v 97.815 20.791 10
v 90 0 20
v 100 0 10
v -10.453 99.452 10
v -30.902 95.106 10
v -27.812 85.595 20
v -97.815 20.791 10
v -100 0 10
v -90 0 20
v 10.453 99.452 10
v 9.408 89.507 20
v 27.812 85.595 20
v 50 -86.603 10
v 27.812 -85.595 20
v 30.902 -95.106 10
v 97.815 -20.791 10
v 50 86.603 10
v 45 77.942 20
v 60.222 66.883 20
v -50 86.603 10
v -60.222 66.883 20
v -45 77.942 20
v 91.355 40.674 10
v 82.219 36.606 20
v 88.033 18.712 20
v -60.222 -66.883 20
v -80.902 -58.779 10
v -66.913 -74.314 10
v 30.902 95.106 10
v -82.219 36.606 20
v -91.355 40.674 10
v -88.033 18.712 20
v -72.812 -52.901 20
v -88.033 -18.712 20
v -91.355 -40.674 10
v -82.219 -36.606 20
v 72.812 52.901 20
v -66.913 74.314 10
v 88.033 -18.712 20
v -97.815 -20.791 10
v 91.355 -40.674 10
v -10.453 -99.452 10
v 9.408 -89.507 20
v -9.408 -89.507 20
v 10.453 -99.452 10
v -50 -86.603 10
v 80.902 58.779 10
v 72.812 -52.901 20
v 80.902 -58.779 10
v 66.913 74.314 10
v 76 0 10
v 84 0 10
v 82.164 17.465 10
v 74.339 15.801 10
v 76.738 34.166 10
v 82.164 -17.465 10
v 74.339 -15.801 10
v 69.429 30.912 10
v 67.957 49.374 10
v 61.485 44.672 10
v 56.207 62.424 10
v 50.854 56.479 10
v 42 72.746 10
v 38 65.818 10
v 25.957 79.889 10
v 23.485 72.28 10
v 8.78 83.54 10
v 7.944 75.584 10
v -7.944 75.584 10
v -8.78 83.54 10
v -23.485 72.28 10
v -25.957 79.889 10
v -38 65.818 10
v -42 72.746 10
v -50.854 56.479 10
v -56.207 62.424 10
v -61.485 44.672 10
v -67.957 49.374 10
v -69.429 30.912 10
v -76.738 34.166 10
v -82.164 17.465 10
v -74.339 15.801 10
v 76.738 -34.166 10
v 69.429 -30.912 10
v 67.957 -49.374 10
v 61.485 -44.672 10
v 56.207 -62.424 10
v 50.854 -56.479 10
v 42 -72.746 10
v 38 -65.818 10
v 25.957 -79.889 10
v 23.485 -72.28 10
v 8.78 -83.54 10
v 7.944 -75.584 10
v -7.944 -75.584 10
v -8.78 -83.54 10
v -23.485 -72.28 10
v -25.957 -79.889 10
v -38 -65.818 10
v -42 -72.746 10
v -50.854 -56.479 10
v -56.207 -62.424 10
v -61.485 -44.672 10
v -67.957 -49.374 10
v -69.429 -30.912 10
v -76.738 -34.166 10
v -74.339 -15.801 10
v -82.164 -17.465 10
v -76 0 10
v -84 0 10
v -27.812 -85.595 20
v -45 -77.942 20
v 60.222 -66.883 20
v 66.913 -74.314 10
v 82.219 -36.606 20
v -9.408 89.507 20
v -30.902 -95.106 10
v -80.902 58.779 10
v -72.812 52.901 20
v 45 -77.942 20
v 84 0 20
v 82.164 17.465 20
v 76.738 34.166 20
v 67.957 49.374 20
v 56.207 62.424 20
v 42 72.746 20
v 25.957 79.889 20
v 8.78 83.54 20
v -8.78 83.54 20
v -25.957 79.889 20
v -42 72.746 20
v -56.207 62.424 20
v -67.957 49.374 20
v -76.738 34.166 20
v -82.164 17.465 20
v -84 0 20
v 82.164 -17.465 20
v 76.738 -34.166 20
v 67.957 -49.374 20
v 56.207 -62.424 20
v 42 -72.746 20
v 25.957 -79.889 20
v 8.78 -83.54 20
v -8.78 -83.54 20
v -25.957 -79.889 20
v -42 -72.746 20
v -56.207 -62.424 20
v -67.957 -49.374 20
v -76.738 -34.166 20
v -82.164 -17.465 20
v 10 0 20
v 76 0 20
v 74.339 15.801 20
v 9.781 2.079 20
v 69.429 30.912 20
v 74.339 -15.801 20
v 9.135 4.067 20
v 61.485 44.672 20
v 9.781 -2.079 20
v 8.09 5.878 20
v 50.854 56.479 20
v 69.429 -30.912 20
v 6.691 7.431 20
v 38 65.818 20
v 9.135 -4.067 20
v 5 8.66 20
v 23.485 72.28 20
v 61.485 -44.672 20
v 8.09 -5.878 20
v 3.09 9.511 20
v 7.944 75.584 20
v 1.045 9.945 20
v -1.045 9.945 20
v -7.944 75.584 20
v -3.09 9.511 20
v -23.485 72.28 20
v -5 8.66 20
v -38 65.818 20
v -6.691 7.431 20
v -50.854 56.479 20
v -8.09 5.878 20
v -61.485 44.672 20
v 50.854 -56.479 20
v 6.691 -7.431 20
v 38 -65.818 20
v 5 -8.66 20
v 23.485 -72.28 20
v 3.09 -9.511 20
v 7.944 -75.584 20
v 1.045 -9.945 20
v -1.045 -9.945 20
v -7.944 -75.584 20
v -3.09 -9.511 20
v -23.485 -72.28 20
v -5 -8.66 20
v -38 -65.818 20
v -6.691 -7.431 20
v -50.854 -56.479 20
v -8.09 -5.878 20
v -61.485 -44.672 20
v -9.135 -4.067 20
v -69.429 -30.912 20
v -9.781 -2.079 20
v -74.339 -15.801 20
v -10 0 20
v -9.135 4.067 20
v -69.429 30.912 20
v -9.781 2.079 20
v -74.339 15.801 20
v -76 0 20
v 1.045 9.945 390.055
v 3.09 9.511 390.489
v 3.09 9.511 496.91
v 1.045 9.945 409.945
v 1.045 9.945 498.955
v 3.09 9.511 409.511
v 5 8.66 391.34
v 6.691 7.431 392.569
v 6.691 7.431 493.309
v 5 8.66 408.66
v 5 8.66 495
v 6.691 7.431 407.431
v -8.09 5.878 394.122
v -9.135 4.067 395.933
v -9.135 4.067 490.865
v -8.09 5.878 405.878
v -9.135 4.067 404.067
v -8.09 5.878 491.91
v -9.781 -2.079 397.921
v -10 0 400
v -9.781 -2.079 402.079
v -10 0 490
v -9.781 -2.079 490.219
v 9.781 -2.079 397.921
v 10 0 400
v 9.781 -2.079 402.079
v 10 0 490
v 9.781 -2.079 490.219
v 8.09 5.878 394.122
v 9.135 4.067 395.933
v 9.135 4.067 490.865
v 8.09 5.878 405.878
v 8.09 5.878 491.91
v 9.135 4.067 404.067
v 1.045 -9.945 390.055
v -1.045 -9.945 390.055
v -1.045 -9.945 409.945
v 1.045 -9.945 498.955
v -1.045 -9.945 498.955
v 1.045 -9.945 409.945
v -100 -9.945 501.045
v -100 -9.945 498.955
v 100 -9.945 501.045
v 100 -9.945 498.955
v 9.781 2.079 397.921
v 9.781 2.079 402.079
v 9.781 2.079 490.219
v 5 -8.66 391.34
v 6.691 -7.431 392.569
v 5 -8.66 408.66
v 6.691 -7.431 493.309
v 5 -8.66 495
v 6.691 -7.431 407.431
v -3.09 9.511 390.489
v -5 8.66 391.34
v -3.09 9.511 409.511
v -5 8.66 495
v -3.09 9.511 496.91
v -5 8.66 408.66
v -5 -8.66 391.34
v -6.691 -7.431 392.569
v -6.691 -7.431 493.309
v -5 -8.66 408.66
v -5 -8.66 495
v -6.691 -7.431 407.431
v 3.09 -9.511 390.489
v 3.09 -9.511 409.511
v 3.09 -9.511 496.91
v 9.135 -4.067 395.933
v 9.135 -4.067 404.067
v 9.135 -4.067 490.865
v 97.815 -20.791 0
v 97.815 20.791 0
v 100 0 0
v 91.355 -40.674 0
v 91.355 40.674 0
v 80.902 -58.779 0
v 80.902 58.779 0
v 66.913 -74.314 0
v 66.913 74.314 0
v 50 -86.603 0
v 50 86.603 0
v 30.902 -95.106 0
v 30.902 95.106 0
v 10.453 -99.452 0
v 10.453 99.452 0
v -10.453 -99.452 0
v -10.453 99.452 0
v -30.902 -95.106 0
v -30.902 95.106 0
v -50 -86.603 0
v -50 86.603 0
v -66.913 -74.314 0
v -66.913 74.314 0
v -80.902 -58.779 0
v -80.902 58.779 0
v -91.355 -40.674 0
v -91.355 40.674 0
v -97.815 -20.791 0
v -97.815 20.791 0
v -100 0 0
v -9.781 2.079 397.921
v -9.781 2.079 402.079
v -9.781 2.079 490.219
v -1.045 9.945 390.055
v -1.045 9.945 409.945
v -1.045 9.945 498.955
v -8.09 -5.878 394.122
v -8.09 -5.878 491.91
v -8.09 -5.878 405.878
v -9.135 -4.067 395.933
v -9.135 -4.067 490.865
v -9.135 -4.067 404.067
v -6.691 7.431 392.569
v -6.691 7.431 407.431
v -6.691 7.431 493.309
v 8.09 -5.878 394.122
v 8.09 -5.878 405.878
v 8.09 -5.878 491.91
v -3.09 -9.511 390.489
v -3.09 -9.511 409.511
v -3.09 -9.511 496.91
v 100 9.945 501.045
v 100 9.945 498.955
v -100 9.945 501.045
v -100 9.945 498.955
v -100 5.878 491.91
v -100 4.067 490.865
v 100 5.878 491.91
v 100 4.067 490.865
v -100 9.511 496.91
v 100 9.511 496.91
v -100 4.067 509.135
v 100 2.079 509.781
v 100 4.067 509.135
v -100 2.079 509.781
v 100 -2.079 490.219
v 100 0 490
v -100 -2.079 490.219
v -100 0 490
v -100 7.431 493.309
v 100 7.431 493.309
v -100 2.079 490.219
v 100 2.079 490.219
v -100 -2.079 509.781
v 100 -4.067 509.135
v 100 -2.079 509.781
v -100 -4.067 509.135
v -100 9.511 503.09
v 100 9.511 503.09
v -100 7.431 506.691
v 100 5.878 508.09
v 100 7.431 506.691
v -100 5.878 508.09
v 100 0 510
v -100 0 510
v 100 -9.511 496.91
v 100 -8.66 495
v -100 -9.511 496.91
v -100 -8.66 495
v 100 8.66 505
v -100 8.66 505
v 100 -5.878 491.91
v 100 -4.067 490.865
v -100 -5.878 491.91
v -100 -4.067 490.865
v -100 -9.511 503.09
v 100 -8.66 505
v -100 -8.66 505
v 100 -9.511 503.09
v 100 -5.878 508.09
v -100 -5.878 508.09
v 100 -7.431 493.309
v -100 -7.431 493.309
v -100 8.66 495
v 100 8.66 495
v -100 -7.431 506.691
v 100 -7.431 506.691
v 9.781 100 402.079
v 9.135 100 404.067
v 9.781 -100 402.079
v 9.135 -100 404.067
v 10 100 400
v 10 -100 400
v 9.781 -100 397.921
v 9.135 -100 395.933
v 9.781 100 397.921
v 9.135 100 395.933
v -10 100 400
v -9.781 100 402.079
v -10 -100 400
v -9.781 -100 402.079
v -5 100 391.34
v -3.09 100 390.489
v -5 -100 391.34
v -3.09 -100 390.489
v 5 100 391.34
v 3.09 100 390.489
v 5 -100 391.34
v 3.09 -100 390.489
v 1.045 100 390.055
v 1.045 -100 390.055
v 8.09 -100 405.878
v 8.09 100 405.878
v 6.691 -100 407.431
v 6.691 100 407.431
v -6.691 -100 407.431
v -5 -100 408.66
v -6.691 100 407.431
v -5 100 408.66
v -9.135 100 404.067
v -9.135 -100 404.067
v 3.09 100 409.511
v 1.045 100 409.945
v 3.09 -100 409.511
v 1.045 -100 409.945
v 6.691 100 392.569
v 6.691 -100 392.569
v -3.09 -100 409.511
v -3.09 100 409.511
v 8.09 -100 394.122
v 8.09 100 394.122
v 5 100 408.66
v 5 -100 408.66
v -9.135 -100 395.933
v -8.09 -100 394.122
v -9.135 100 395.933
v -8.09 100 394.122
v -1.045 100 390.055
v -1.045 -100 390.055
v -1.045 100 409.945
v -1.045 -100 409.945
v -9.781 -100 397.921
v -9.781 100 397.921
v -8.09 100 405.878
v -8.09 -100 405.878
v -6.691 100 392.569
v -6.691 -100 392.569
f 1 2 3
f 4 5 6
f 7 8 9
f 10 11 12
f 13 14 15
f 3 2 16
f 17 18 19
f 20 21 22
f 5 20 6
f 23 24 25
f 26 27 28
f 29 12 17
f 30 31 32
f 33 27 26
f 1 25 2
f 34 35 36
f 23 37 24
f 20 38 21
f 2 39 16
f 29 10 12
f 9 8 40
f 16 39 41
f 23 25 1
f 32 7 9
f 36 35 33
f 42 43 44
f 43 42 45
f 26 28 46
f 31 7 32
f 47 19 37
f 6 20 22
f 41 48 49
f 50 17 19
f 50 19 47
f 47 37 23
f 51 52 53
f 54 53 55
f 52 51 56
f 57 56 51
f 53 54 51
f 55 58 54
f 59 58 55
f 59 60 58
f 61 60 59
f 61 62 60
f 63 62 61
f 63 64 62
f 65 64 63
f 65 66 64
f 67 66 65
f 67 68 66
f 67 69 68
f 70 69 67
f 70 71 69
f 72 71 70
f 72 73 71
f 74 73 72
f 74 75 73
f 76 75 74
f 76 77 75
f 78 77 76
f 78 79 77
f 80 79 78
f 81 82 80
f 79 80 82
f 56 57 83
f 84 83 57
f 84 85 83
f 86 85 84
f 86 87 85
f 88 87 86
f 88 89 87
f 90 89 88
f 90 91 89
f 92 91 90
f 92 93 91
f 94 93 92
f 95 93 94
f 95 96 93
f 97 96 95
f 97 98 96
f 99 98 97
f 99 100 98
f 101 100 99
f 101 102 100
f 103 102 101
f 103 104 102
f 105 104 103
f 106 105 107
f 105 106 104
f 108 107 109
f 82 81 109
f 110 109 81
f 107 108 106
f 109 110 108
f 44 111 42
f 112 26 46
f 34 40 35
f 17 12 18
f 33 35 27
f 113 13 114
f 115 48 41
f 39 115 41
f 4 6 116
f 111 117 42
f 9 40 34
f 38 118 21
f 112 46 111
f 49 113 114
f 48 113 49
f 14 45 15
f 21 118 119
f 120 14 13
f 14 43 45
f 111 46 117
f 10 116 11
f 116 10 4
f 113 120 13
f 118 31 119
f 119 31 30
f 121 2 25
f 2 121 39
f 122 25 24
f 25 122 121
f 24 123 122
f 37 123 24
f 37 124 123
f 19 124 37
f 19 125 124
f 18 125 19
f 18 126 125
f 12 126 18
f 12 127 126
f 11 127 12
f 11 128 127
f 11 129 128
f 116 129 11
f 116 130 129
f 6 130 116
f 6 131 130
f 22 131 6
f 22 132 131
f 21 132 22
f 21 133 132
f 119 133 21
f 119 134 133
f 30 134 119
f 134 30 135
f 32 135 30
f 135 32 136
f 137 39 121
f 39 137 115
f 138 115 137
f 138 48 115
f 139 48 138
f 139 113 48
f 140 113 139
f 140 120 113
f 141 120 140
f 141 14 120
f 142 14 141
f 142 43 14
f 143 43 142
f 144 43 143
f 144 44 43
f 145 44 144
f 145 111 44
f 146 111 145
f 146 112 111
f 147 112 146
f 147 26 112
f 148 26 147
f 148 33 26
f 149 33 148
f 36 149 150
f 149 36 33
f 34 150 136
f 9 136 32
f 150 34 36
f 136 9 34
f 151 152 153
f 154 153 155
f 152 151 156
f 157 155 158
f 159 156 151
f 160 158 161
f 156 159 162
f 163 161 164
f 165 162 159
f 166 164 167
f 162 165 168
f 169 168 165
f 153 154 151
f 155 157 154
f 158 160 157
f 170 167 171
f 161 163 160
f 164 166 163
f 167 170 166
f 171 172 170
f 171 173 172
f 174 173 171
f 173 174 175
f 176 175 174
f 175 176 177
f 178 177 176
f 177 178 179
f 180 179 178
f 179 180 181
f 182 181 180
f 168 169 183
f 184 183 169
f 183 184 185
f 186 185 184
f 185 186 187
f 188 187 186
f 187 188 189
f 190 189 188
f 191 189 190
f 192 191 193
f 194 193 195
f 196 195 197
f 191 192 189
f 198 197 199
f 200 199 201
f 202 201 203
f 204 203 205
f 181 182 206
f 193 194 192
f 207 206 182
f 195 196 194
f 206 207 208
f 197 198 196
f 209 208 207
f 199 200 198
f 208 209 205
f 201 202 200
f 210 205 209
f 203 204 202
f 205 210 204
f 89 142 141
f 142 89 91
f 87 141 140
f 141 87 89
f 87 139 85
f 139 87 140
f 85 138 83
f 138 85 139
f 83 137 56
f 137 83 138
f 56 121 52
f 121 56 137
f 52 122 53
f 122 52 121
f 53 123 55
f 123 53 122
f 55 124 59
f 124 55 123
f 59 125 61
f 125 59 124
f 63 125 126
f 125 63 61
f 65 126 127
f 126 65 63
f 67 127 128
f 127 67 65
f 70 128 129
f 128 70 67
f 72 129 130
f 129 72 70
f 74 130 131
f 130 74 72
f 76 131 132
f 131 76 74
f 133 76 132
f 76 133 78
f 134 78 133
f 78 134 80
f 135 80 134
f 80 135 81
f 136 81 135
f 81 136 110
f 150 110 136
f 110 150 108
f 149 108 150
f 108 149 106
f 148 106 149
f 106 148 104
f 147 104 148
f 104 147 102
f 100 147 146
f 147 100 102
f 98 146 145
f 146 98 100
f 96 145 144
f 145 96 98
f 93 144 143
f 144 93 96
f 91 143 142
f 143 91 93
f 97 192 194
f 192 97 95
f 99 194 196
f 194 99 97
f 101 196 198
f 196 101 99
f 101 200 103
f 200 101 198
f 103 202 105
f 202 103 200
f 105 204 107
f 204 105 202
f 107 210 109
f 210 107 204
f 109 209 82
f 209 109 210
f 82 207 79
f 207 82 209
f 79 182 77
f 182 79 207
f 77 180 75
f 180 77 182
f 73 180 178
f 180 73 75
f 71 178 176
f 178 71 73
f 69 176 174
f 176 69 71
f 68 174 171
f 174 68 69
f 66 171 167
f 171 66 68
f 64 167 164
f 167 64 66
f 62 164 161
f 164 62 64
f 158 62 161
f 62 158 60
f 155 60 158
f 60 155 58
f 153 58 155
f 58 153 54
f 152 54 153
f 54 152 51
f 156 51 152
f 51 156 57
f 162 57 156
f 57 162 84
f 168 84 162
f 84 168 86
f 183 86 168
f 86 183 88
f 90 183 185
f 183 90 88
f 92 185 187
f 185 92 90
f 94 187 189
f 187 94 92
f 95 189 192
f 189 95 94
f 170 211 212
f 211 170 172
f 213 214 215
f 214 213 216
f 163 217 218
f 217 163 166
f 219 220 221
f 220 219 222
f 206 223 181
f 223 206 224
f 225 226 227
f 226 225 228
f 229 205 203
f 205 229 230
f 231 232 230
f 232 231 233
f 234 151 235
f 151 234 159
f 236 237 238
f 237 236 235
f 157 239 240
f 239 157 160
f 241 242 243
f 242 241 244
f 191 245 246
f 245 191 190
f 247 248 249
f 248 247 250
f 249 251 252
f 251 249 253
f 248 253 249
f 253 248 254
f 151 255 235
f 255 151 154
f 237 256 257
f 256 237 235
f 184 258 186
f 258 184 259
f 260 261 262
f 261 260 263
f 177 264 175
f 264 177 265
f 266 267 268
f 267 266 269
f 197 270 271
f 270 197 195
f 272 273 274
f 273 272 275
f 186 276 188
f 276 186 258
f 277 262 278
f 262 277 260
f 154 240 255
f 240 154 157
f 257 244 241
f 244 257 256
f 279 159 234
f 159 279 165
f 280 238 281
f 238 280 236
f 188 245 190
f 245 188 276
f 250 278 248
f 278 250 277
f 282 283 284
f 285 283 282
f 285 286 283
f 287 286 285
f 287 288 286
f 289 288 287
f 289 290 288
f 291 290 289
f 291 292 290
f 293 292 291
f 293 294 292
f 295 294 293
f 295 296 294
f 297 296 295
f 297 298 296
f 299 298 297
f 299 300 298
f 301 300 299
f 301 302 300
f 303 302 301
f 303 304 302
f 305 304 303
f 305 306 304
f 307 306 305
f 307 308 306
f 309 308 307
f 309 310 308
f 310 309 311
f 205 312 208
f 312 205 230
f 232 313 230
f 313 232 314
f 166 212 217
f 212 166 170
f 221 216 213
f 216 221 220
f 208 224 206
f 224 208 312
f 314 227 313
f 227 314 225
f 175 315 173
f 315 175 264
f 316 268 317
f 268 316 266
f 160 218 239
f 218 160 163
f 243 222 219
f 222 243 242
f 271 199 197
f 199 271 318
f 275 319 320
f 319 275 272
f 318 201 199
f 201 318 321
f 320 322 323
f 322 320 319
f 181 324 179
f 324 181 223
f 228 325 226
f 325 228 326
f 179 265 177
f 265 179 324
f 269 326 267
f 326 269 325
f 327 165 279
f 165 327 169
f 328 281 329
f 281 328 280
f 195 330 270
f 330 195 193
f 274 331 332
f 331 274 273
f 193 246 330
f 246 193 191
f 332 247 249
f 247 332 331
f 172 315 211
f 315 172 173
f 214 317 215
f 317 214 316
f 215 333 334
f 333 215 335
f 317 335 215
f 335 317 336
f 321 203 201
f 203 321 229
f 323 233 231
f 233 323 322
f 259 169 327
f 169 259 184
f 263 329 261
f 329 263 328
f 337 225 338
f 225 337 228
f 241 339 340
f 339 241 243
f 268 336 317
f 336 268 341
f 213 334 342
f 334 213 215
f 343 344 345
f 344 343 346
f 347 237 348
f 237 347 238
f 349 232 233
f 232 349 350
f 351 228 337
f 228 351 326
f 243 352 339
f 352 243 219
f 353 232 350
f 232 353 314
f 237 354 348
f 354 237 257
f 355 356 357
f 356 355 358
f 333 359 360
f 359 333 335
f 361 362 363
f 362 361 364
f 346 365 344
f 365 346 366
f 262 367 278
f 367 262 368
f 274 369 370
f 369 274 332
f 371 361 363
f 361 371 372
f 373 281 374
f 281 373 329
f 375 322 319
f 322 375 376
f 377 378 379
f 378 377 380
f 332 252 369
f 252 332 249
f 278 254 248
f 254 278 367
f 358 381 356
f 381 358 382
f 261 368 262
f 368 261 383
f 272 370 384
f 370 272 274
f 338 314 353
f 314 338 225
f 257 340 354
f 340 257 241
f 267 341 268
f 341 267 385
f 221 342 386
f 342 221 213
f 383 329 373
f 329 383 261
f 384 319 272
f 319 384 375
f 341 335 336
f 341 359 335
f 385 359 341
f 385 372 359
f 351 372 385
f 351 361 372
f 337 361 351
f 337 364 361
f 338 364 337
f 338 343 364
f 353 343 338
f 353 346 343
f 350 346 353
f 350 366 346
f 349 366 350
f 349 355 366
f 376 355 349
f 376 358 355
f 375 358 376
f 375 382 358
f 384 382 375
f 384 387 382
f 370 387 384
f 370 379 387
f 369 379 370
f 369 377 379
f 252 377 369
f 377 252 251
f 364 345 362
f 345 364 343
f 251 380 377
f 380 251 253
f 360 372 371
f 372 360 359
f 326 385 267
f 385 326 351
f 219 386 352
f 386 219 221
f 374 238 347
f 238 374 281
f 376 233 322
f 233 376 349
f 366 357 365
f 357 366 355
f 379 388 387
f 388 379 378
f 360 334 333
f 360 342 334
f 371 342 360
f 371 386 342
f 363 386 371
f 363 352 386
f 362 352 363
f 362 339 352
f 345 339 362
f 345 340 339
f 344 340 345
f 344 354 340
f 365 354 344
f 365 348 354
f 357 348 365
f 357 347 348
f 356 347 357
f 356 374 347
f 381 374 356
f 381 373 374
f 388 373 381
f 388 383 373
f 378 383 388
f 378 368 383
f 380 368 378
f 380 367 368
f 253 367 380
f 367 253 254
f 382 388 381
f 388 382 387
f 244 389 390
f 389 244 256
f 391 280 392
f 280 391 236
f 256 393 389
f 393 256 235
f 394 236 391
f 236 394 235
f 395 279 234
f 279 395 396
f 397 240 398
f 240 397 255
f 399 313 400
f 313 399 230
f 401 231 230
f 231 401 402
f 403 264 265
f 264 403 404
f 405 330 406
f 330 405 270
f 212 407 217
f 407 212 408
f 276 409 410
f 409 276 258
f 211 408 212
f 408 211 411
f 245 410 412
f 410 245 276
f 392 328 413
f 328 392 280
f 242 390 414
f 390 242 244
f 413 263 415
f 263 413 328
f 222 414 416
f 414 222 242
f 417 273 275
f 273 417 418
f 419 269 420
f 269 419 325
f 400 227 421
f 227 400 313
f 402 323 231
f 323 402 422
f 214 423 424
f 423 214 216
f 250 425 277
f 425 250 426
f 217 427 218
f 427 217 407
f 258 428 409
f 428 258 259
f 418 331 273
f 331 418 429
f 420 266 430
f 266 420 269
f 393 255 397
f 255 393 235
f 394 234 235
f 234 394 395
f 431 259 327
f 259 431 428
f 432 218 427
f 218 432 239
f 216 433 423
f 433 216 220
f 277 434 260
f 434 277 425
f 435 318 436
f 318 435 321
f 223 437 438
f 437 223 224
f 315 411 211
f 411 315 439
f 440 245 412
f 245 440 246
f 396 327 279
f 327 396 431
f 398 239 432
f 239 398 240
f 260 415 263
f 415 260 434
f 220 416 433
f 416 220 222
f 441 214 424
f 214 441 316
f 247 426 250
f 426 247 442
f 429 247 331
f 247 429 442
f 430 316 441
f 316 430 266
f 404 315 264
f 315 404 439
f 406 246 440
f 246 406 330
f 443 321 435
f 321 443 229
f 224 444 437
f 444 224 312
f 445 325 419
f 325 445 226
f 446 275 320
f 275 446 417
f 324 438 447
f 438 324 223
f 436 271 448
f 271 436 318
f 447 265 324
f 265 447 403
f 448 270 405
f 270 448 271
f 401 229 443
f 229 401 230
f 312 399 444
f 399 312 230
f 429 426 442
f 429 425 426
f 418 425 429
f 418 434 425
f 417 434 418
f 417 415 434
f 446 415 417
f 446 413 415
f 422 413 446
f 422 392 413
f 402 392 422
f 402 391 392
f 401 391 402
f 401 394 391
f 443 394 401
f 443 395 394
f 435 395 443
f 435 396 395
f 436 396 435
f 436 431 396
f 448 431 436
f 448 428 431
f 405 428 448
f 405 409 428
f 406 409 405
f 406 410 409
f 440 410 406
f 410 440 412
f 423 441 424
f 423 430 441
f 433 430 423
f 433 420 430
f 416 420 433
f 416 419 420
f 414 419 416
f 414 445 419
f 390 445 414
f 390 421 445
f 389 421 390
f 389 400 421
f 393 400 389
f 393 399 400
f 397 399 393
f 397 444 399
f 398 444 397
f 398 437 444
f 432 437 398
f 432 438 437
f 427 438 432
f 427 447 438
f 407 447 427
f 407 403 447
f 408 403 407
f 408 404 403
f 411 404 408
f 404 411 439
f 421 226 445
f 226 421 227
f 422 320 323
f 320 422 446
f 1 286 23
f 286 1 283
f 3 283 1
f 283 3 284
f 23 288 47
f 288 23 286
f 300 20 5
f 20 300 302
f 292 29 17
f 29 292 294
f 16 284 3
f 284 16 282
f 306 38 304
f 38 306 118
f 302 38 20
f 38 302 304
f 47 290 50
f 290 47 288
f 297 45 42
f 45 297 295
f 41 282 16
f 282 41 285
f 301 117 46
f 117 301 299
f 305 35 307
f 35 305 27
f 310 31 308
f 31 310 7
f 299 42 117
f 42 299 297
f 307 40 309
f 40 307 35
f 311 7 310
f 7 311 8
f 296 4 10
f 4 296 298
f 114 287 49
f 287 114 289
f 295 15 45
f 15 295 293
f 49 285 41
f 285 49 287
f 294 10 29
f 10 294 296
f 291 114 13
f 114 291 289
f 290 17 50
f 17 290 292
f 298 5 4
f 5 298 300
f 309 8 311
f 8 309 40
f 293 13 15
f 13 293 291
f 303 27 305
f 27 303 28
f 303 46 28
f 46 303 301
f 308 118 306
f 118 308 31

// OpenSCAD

bottomheigh=10;
radius=100;

bodyheigh=10;
rauiussmall=90;

thickness=8;
holedeep=10;

stickheigh=500;
stickradius=10;

branchlong=200;
branchradius=10;

branch02heigh=100;
///////////////////////////////////RENDER

//middle stick
stick();

//branch01
rotate(a=90,v=[0,1,0]){
translate([-stickheigh,0,0])
branch();
}    
//branch02
rotate(a=90,v=[1,0,0]){
translate([0,stickheigh-branch02heigh,0])
branch();
}
//body
difference(){
    
translate([0,0,bottomheigh])
body();
    
translate([0,0,bodyheigh])
linear_extrude(heigh=holedeep)
hole();    

}
//bottom
bottom();

///////////////////////////////////MODULE

module bottom(){
cylinder(h=bottomheigh,r=radius);
}

module body(){
cylinder(h=bodyheigh,r1=radius,r2=rauiussmall);   
}
module hole(){
difference(){
circle(r=rauiussmall-6);
circle(r=rauiussmall-6-thickness);
}
}
module stick(){
cylinder(h=stickheigh,r=stickradius);
}
module branch(){
  cylinder(h=branchlong,r=branchradius,center=true);  
}
